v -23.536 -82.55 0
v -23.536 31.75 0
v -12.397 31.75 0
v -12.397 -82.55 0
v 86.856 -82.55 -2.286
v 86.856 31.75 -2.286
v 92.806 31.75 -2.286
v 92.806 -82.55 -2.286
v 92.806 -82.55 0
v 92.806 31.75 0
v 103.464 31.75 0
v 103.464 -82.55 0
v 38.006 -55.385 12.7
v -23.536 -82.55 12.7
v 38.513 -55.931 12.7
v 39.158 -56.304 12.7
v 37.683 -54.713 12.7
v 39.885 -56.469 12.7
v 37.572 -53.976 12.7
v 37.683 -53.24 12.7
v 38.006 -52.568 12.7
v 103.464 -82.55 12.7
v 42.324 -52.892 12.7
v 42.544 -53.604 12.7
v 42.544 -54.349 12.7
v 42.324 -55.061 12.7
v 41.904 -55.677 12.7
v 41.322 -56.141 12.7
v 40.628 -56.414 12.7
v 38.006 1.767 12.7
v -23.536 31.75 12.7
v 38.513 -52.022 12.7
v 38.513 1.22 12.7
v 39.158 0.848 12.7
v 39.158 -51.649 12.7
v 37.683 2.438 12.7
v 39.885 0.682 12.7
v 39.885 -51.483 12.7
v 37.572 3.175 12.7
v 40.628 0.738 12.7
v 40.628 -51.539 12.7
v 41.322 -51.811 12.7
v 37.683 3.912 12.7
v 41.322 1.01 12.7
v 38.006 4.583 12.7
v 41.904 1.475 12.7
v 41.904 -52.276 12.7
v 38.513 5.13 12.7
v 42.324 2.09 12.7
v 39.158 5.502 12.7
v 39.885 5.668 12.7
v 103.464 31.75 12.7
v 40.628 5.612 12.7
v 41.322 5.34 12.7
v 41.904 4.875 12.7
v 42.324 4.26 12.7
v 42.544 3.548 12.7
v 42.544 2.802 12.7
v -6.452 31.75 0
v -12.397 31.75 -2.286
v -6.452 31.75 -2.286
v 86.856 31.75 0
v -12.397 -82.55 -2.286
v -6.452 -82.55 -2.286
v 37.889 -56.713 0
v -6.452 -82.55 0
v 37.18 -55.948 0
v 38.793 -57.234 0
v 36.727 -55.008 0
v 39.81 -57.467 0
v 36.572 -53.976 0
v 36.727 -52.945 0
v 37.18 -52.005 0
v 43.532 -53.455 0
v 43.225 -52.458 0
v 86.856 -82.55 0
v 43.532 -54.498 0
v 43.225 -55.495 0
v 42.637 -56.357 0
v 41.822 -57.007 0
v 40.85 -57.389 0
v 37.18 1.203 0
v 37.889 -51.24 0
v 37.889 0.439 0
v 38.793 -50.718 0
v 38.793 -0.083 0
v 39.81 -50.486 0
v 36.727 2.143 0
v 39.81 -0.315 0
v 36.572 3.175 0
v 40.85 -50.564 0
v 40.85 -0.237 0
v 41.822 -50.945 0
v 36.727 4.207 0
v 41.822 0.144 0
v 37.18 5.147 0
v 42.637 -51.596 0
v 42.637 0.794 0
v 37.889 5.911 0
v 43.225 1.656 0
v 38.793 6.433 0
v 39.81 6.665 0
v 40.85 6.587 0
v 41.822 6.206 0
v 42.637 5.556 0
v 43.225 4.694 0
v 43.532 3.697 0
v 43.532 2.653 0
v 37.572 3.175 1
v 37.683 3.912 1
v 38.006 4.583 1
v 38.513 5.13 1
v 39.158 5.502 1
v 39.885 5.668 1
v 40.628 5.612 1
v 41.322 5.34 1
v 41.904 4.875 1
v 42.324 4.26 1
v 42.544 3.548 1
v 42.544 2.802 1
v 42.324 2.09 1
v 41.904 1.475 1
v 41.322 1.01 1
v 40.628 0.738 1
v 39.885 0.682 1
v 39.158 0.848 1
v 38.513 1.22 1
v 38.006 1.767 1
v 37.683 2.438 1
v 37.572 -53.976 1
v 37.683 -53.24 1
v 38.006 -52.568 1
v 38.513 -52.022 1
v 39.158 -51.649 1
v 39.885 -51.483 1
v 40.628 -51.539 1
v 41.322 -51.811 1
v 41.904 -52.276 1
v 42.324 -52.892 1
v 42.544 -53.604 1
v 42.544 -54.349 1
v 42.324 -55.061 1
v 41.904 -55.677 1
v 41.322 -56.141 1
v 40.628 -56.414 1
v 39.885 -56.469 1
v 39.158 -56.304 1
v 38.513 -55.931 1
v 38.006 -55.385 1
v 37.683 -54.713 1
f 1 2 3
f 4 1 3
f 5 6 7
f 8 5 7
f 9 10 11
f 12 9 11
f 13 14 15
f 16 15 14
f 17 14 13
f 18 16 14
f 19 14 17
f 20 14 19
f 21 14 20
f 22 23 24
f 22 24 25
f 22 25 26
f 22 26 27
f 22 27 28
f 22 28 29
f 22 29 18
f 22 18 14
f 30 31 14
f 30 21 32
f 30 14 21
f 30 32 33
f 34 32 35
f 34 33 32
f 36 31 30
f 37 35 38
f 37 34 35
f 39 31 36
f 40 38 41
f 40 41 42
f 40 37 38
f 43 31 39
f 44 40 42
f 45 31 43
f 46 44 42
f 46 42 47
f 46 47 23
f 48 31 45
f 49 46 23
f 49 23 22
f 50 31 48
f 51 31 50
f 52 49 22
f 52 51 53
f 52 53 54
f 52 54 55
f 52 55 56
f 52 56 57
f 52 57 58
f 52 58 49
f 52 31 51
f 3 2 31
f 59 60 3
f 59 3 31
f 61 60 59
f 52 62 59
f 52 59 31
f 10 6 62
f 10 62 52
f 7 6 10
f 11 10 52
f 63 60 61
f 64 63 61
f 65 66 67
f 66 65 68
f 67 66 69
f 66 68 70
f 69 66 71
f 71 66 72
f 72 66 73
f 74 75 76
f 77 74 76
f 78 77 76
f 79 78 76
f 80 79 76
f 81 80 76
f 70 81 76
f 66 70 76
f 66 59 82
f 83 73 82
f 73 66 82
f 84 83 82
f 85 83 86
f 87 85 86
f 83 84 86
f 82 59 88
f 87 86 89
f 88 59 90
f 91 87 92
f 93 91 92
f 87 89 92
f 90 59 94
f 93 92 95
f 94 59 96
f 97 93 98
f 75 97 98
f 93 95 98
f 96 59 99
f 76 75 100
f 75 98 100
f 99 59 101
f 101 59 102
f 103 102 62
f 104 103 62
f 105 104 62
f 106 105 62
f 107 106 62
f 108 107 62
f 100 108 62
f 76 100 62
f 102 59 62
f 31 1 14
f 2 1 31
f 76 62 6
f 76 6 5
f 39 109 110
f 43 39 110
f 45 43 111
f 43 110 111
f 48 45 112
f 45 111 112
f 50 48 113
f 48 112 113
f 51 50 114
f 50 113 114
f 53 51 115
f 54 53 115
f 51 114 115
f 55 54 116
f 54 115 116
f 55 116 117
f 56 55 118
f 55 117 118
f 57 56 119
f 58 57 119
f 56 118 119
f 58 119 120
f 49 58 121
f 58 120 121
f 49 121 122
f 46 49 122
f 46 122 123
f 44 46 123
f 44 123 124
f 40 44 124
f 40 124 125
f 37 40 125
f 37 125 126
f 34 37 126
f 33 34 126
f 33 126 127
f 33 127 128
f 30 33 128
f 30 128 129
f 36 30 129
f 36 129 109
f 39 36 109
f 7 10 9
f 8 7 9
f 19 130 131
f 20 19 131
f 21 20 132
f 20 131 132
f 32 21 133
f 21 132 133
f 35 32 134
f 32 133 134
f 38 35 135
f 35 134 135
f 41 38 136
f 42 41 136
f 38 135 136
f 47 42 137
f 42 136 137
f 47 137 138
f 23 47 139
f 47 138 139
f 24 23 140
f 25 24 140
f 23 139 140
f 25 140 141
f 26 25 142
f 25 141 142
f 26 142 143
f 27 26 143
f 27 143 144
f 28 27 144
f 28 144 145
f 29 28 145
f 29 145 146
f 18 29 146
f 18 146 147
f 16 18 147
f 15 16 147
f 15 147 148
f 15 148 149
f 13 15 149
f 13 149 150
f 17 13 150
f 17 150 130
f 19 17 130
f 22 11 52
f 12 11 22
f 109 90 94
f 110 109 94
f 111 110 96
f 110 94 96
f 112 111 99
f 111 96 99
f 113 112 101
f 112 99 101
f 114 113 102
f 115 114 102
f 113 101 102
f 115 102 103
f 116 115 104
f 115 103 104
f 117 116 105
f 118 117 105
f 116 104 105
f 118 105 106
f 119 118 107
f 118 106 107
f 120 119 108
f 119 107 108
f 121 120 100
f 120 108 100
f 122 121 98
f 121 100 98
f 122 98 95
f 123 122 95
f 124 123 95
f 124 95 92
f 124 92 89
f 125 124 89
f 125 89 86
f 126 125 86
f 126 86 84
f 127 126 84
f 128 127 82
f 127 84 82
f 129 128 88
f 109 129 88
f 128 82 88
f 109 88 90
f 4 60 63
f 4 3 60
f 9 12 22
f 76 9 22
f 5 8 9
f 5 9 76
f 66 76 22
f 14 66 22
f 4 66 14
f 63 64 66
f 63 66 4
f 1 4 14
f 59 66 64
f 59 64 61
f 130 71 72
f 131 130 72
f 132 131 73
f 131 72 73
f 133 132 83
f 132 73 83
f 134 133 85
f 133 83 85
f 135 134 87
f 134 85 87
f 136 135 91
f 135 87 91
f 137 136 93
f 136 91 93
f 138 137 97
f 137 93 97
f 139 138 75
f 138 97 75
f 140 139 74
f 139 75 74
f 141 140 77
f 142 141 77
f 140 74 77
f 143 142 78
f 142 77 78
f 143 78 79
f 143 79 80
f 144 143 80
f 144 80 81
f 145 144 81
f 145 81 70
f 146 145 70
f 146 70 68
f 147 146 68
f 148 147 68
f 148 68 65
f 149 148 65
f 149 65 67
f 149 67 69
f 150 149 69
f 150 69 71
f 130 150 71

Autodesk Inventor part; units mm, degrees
ref_plane "YZ Plane" through (0, 0, 0) normal (1, 0, 0) x (0, 1, 0)
ref_plane "XZ Plane" through (0, 0, 0) normal (0, 1, 0) x (-1, 0, 0)
ref_plane "XY Plane" through (0, 0, 0) normal (0, 0, 1) x (1, 0, 0)
sketch "Sketch1" plane through (0, 0, 0) normal (0, 0, 1) x (1, 0, 0)
  line L0 (86.5564, -16.51) -> (86.5564, 16.51) projected
  line L1 (93.1064, -19.05) -> (93.1064, 19.05) projected
  line L2 (86.5564, 19.05) -> (86.5564, -19.05) projected
  line L3 (93.1064, -19.05) -> (93.1064, 19.05) projected
  line L4 (-12.6968, 19.05) -> (-12.6968, -19.05) projected
  line L5 (-6.1468, -19.05) -> (-6.1468, 19.05) projected
  line L6 (-12.6968, -31.75) -> (-12.6968, -69.85) projected
  line L7 (-6.1468, -69.85) -> (-6.1468, -31.75) projected
  line L8 (86.5564, -31.75) -> (86.5564, -69.85) projected
  line L9 (93.1064, -69.85) -> (93.1064, -31.75) projected
  line L10 (-12.6968, -19.05) -> (-12.6968, -31.75)
  line L11 (-6.1468, -31.75) -> (-6.1468, -19.05)
  line L12 (-12.3968, -19.05) -> (-12.3968, 18.85)
  line L13 (-6.4516, 18.85) -> (-6.4516, -19.05)
  line L14 (-6.4516, -19.05) -> (-6.4516, -31.75)
  line L15 (-6.4516, -31.75) -> (-6.4516, -69.65)
  line L16 (-12.3968, -69.65) -> (-12.3968, -31.75)
  line L17 (-12.3968, -31.75) -> (-12.3968, -19.05)
  line L18 (8.247, -25.4) -> (71.6799, -25.4) construction
  line L19 (39.9635, 46.4598) -> (39.9635, -93.3096) construction
  line L20 (-23.5365, 31.75) -> (103.4635, 31.75)
  line L21 (103.4635, 31.75) -> (103.4635, -82.55)
  line L22 (103.4635, -82.55) -> (-23.5365, -82.55)
  line L23 (-23.5365, -82.55) -> (-23.5365, 31.75)
  line L24 (-23.5365, 31.75) -> (103.4635, -82.55) construction
  line L25 (103.4635, 31.75) -> (-23.5365, -82.55) construction
  line L26 (86.5564, -19.05) -> (86.5564, -31.75)
  line L27 (93.1064, -31.75) -> (93.1064, -19.05)
  line L28 (86.5564, 19.05) -> (86.5564, 31.75)
  line L29 (93.1064, 19.05) -> (93.1064, 31.75)
  line L30 (93.1064, -69.85) -> (93.1064, -82.55)
  line L31 (86.5564, -69.85) -> (86.5564, -82.55)
  line L32 (-12.3968, 18.85) -> (-12.3968, 31.75)
  line L33 (-6.4516, 18.85) -> (-6.4516, 31.75)
  line L34 (-6.1468, -69.85) -> (-6.1468, -82.55)
  line L35 (-12.3968, -69.65) -> (-12.3968, -82.55)
  line L36 (-12.6968, 19.05) -> (-12.6968, 31.75)
  line L37 (-6.1468, 19.05) -> (-6.1468, 31.75)
  line L38 (-12.6968, -69.85) -> (-12.6968, -82.55)
  line L39 (-6.4516, -69.65) -> (-6.4516, -82.55)
  line L40 (86.8564, 31.75) -> (86.8564, 19.05)
  line L41 (86.8564, 19.05) -> (86.8564, -19.05)
  line L42 (86.8564, -19.05) -> (86.8564, -31.75)
  line L43 (86.8564, -31.75) -> (86.8564, -69.85)
  line L44 (86.8564, -69.85) -> (86.8564, -82.55)
  line L45 (93.1064, 31.75) -> (93.1064, -82.55)
  line L46 (93.1064, 31.75) -> (93.1064, -82.55)
  line L47 (92.8064, 31.75) -> (92.8064, -82.55)
  point P0 (0, 0)
  point P1 (93.1064, -16.51)
  point P2 (39.9635, -25.4)
  dimension "d0" = 0.3
  dimension "d1" = 127
  dimension "d2" = 114.3
  dimension "d7" = 0.3
  dimension "d8" = 0.3
  dimension "d9" = 0.3048
extrude "Extrusion1" add sketch "Sketch1" against normal blind 2.286 contours L20 L47 L22 L44 L43 L42 L41 L40 | L33 L13 L14 L15 L39 L22 L35 L16 L17 L12 L32 L20
sketch "Sketch2" plane through (0, 0, 0) normal (0, 0, 1) x (1, 0, 0)
  line L0 (103.4635, 31.75) -> (103.4635, -82.55) projected
  line L1 (-23.5365, 31.75) -> (103.4635, 31.75) projected
  line L2 (-23.5365, -82.55) -> (-23.5365, 31.75) projected
  line L3 (103.4635, -82.55) -> (-23.5365, -82.55) projected
  point P0 (0, 0)
  point P1 (93.1064, 31.75)
extrude "Extrusion2" add sketch "Sketch2" along normal blind 12.7
sketch "Sketch3" plane through (0, 0, 12.7) normal (0, 0, 1) x (1, 0, 0)
  line L0 (-23.5365, 31.75) -> (-23.5365, -82.55) projected
  line L1 (-23.5365, -82.55) -> (103.4635, -82.55) projected
  line L2 (103.4635, -82.55) -> (103.4635, 31.75) projected
  line L3 (103.4635, 31.75) -> (-23.5365, 31.75) projected
  point P0 (0, 0)
sketch "Sketch4" plane through (0, 0, 0) normal (0, 0, -1) x (-1, 0, 0)
  line L0 (6.4516, -82.55) -> (6.4516, 31.75) projected
  line L1 (-86.8564, 31.75) -> (6.4516, 31.75) projected
  line L2 (-86.8564, 31.75) -> (-86.8564, -82.55) projected
  line L3 (6.4516, -82.55) -> (-86.8564, -82.55) projected
  line L4 (-39.9406, -25.4) -> (-40.2024, 31.75) construction
  circle A0 centre (-40.0715, 3.175) radius 2.5
  line L5 (-8.2452, -25.4007) -> (-71.9453, -25.4007) construction
  circle A1 centre (-40.0715, -53.9764) radius 2.5
  point P0 (0, 0)
  dimension "d10" = 5
extrude "Extrusion3" cut sketch "Sketch4" against normal up to surface (12.7 mm away) contours A0 | A1
chamfer "Chamfer1" distance 1 angle 45 2 edges at (42.5715, 3.175, 0) (42.5715, -53.9764, 0)
properties part number "CartTrack"
